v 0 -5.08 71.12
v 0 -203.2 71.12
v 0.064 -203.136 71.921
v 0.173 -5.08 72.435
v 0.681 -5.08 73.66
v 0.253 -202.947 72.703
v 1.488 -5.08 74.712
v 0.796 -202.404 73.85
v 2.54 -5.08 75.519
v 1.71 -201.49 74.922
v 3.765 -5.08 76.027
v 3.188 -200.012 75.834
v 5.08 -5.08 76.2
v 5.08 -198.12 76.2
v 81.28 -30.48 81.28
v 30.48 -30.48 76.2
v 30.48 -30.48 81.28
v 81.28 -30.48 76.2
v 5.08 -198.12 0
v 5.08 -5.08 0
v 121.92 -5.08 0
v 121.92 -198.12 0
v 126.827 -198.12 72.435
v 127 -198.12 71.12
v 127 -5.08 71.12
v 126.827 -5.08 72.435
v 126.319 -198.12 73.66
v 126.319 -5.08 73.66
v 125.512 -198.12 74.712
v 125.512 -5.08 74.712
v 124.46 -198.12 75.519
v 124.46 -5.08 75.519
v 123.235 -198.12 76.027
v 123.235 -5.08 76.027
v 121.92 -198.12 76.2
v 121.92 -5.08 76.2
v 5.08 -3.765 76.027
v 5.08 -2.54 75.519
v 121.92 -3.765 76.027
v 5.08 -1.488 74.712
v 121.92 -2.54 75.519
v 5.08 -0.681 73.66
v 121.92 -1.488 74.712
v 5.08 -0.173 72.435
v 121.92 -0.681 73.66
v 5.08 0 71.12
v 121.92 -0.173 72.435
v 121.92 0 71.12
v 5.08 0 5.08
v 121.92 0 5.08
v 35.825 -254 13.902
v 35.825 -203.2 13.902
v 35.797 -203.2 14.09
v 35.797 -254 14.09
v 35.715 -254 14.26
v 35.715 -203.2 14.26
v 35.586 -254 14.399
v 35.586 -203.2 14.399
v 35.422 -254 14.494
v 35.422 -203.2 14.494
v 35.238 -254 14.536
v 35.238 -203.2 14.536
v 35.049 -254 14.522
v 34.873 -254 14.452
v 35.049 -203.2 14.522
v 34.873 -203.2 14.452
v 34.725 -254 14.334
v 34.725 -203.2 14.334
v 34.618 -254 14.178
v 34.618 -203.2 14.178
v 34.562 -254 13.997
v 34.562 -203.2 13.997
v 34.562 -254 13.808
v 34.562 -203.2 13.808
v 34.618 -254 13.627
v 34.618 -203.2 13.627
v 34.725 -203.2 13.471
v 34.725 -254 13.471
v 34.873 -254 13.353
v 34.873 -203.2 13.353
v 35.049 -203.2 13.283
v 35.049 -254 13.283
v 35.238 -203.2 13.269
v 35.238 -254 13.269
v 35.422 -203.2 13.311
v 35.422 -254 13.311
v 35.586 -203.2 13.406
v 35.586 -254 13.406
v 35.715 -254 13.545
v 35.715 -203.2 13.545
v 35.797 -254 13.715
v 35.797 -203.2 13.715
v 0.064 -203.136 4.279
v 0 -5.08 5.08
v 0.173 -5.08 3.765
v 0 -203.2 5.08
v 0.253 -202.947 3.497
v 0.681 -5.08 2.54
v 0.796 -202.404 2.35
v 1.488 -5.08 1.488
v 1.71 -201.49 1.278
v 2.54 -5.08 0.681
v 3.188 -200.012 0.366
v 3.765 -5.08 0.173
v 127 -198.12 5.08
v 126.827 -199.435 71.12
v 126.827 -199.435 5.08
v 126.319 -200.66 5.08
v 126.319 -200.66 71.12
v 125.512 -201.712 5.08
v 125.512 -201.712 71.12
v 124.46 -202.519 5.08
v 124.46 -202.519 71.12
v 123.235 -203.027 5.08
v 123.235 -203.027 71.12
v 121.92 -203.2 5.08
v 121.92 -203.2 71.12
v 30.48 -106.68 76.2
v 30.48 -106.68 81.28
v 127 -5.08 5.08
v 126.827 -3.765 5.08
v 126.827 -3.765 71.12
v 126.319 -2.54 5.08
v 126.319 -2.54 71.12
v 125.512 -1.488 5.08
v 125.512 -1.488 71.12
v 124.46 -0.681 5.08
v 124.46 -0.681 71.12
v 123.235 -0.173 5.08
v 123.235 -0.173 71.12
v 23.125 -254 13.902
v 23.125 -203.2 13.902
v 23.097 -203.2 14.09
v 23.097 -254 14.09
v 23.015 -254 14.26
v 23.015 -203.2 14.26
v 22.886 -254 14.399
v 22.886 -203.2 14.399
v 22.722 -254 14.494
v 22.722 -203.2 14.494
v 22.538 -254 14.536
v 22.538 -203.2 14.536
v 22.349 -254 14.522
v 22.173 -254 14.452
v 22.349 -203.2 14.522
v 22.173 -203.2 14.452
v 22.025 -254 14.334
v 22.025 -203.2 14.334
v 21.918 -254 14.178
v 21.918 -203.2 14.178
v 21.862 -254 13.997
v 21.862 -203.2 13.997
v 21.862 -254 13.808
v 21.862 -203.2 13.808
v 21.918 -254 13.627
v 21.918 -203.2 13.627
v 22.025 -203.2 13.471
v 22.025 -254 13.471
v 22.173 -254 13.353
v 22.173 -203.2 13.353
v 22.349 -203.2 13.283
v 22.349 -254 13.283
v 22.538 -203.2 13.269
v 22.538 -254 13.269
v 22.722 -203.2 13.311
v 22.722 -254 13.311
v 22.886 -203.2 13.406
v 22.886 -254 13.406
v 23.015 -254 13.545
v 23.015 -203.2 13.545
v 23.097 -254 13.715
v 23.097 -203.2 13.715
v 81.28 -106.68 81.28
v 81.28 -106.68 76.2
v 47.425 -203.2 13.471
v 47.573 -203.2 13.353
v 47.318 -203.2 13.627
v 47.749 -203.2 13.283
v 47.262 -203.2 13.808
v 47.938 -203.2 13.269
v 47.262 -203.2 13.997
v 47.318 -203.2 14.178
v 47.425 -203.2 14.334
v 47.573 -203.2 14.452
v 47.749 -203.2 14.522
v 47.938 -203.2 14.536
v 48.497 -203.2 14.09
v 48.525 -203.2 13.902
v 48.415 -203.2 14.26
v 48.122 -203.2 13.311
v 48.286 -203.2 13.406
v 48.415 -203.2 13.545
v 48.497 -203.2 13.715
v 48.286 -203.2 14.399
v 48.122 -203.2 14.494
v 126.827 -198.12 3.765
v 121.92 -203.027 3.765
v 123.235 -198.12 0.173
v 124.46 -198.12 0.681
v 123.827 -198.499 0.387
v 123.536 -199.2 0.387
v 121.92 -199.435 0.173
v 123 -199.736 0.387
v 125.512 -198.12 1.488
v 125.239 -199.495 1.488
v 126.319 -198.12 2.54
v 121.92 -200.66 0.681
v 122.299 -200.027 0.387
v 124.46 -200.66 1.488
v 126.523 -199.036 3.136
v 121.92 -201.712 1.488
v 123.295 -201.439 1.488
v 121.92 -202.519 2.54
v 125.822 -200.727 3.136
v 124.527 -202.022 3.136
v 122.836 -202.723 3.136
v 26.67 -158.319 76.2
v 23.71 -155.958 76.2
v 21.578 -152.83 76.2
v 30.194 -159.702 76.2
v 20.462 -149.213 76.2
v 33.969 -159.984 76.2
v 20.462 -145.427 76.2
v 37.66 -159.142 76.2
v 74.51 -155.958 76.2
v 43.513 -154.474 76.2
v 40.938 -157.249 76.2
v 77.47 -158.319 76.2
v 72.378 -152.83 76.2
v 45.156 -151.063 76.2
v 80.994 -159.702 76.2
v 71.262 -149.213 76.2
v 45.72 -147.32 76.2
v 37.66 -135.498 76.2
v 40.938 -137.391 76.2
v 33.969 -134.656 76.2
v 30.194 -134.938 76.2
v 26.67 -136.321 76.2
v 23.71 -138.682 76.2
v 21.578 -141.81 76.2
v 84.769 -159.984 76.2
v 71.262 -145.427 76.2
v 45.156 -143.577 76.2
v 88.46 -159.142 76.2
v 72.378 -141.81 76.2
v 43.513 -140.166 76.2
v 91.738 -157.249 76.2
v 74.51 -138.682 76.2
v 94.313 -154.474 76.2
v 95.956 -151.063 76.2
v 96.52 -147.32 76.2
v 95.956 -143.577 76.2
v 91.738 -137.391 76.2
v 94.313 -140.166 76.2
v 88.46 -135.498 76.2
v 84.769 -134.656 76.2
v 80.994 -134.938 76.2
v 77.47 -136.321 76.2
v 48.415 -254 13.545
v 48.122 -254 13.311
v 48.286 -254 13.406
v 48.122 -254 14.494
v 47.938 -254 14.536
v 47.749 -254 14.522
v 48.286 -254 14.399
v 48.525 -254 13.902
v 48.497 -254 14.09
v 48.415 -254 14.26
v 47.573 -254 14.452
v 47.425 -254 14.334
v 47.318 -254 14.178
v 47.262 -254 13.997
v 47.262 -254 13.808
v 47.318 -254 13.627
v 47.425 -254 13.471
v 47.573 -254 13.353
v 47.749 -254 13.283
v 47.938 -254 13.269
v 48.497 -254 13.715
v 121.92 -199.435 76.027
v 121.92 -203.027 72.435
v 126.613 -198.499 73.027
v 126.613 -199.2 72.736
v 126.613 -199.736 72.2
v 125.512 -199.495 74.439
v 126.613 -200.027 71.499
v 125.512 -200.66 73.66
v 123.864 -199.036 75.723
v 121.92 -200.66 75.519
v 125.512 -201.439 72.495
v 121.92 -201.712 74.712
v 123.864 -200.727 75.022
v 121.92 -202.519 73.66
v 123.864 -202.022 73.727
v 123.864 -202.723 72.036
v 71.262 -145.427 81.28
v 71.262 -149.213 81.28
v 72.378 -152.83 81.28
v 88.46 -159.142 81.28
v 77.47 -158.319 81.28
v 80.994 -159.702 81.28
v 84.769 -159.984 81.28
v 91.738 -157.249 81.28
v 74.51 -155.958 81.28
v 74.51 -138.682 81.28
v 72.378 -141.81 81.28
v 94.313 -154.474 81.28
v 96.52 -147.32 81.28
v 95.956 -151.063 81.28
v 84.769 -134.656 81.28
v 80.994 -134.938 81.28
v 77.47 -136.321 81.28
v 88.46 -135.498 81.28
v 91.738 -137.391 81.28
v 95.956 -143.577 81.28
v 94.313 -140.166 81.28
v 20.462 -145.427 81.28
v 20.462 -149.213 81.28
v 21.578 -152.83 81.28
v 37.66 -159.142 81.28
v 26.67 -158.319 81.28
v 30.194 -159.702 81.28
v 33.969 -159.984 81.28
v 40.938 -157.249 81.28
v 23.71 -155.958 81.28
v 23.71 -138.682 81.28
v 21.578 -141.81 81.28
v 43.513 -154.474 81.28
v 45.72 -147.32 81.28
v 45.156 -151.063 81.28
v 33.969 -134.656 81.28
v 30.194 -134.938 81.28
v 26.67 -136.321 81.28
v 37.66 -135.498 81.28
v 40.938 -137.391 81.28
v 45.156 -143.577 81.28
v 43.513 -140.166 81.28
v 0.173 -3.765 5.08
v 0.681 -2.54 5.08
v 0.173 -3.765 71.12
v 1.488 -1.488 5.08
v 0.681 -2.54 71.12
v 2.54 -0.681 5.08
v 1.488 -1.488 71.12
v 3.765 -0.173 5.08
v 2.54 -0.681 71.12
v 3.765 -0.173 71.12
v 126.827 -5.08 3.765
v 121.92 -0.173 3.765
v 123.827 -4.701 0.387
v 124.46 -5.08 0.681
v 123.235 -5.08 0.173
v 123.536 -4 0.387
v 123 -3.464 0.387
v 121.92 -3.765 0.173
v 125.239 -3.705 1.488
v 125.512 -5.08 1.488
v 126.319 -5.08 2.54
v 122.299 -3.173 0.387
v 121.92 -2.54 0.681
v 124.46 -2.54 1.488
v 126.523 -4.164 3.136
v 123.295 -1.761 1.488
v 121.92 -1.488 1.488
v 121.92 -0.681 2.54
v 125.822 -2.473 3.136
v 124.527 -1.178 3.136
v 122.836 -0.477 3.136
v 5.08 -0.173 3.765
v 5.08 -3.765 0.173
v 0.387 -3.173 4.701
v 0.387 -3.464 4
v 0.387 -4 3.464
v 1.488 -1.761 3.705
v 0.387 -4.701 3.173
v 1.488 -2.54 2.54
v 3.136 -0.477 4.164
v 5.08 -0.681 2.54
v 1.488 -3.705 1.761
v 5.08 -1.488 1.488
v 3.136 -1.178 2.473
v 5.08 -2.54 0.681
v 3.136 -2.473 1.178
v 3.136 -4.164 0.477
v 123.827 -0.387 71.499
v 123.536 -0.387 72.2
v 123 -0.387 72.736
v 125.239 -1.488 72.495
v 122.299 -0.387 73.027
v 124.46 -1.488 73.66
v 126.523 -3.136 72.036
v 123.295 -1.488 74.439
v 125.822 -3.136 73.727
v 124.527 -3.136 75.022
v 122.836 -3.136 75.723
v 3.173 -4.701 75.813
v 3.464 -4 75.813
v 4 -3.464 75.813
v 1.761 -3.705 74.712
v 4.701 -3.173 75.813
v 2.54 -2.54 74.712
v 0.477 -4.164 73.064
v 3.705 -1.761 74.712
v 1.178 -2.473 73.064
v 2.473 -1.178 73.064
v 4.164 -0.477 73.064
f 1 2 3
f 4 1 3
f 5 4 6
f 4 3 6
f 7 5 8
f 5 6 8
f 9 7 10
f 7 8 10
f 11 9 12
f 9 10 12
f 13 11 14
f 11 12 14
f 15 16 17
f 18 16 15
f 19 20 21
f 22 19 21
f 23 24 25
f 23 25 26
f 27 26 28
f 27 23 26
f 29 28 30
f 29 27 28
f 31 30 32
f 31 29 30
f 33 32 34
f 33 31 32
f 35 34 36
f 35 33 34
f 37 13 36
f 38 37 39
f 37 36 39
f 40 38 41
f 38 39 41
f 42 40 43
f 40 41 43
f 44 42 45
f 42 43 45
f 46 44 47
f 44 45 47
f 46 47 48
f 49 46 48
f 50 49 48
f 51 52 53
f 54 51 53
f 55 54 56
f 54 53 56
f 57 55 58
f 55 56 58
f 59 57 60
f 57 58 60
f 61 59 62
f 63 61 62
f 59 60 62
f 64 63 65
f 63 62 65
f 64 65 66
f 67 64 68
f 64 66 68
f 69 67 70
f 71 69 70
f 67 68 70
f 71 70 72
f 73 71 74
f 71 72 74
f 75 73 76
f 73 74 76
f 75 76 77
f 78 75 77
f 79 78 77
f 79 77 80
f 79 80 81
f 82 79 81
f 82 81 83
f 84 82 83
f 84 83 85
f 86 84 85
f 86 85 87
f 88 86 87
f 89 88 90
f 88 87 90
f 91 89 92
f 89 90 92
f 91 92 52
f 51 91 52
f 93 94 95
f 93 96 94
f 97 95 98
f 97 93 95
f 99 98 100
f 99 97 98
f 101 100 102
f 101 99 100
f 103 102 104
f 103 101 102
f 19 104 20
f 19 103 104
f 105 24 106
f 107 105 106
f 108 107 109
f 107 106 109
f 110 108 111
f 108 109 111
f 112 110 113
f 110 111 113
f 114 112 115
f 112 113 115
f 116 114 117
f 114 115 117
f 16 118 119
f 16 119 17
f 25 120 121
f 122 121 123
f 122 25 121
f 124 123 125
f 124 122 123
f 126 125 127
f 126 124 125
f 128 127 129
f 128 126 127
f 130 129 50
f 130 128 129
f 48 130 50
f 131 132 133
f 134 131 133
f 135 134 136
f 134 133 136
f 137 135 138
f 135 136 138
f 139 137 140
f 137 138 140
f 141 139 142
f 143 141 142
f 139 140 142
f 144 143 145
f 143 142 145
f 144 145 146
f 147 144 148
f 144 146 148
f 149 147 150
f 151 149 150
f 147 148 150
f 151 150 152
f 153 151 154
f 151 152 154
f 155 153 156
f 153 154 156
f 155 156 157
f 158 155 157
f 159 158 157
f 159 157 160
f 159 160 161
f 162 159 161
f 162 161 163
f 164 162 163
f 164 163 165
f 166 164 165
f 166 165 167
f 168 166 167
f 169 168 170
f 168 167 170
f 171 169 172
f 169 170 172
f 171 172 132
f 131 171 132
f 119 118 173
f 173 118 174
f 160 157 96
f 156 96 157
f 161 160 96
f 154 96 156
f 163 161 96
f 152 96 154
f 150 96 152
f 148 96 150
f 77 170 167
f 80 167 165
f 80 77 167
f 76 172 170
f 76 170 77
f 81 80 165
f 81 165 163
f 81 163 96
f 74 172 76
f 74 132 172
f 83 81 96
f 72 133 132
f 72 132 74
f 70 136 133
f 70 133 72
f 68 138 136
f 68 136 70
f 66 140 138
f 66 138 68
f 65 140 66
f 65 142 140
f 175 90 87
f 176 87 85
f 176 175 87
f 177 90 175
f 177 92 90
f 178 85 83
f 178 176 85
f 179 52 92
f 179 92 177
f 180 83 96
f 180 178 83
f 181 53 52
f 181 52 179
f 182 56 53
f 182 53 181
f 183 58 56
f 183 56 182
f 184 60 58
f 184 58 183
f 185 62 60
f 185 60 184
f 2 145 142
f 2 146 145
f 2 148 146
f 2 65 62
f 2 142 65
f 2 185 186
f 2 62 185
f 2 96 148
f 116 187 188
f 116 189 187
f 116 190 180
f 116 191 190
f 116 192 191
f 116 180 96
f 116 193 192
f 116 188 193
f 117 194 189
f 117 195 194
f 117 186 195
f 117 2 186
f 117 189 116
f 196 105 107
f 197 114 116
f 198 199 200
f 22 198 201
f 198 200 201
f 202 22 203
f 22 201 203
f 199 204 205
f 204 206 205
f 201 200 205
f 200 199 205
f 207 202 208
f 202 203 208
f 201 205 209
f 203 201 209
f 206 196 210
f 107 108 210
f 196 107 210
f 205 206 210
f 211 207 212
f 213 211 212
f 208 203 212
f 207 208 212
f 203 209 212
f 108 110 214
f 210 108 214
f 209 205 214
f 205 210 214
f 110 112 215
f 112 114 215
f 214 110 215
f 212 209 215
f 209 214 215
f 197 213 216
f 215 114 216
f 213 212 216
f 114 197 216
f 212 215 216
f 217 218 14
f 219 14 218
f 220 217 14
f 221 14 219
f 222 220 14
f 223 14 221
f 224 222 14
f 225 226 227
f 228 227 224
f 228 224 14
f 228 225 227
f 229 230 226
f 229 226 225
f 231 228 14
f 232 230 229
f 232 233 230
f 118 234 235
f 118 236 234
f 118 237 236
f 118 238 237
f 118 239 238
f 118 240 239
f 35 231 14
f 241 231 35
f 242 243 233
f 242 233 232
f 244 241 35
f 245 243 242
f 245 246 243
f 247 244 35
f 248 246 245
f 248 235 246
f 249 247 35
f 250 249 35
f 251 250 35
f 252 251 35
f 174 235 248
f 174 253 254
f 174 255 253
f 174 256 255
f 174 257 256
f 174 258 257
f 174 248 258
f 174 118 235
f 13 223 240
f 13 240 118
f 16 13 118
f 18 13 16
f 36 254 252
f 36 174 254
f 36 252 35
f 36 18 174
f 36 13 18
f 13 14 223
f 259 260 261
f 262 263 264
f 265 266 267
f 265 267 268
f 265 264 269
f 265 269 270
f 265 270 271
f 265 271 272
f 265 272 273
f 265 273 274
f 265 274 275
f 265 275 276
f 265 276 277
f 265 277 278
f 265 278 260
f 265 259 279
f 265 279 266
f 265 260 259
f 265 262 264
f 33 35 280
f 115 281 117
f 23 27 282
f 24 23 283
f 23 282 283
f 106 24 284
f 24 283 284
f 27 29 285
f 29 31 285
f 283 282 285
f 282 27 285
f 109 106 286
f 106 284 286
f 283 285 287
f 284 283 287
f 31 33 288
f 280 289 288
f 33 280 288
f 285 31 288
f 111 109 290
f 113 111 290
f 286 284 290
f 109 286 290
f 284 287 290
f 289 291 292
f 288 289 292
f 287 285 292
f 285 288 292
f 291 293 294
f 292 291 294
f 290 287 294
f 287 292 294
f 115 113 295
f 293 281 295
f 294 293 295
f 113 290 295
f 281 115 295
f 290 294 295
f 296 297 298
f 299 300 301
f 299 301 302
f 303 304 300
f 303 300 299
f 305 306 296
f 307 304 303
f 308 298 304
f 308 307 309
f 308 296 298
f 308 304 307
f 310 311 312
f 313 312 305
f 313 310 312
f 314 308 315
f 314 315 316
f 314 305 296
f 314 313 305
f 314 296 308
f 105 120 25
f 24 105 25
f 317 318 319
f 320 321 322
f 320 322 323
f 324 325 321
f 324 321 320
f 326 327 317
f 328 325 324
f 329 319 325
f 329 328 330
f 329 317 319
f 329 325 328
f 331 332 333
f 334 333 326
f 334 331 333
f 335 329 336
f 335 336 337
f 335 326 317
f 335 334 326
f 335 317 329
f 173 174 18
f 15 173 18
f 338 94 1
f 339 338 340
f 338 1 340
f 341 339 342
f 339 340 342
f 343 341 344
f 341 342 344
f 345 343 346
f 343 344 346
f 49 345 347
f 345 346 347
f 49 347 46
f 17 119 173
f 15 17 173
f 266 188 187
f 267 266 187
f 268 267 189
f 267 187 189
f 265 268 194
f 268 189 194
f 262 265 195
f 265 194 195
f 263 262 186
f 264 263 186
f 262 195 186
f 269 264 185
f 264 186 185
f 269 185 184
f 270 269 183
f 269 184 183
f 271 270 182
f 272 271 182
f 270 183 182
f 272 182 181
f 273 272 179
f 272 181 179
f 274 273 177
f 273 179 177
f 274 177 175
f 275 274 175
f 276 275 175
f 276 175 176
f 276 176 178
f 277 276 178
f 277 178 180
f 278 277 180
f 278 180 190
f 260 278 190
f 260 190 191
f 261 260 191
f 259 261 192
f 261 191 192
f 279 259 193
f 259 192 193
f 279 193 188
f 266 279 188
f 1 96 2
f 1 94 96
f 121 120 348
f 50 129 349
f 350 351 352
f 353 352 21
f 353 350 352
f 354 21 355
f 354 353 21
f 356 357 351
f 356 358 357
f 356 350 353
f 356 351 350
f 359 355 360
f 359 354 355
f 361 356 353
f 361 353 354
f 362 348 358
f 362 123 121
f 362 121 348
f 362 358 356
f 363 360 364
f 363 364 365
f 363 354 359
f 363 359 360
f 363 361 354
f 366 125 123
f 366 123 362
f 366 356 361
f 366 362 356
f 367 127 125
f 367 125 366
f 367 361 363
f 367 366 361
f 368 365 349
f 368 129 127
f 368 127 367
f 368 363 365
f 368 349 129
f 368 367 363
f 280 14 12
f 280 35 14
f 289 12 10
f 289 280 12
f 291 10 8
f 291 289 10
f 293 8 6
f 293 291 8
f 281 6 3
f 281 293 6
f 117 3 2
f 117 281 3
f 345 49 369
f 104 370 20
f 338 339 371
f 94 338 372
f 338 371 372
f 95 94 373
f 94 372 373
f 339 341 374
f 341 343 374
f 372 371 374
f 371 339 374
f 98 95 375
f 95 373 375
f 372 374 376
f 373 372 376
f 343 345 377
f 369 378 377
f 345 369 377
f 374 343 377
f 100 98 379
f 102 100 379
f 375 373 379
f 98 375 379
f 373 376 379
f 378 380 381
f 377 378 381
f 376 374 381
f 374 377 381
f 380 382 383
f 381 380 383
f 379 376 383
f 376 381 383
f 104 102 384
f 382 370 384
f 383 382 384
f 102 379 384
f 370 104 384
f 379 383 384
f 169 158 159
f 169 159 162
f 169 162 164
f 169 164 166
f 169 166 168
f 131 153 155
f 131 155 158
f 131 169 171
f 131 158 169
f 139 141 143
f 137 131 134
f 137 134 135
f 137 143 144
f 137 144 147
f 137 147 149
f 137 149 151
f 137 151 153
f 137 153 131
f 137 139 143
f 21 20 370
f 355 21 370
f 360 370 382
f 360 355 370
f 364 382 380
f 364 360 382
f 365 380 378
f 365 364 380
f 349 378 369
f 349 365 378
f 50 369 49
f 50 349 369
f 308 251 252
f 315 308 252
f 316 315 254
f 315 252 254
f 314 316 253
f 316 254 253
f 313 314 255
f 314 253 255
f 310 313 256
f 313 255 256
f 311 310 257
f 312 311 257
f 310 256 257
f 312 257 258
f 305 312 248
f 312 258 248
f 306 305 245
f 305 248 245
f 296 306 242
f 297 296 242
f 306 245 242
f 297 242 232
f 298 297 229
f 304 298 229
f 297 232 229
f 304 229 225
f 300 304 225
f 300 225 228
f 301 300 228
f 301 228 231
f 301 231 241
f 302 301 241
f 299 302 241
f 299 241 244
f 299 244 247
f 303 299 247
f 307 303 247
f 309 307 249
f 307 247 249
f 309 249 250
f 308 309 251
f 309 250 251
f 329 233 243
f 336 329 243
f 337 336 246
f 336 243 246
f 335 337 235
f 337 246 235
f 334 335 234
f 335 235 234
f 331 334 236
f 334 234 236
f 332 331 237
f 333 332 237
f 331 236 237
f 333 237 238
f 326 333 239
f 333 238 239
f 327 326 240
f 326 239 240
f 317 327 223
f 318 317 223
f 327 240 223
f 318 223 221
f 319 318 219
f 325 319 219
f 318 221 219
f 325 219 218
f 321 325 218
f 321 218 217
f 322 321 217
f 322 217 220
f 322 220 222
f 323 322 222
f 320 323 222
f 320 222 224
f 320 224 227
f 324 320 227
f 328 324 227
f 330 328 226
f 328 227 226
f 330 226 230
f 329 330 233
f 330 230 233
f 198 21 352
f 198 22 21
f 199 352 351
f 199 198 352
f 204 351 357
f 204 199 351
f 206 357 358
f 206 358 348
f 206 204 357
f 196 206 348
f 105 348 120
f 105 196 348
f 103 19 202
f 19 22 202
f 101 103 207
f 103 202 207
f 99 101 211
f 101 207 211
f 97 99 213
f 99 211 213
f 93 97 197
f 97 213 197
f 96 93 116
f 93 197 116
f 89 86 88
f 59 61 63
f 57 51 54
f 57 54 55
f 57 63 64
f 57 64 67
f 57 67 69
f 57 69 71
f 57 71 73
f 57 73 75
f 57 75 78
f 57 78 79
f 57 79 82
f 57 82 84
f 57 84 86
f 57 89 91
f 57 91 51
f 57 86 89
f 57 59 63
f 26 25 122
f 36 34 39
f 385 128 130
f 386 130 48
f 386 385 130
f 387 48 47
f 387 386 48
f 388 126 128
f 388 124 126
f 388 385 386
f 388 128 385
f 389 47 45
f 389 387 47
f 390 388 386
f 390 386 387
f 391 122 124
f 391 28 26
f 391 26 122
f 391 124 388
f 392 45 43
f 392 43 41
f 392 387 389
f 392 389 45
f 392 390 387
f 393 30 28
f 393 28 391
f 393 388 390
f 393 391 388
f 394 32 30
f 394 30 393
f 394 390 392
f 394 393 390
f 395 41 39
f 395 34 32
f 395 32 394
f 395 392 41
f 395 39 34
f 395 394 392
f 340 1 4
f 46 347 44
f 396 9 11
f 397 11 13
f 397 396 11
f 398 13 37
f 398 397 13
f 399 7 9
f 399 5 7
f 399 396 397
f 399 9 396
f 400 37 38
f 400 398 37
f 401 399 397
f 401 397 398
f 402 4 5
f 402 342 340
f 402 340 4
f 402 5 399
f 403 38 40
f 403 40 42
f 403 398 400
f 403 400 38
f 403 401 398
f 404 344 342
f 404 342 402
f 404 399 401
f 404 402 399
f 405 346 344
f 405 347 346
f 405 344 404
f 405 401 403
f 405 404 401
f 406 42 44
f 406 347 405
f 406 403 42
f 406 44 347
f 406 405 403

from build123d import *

# Parameters (mm, degrees)
F0_W     = 127
F0_H     = 76.2
F1_DEPTH = 203.2
F2_R     = 5.08
F3_R     = 0.635
F4_DEPTH = 50.8
F5_W     = 50.8
F5_H     = 76.2
F5_R     = 12.7
F6_DEPTH = 5.08


with BuildPart() as f1:
    # F0 (on Front) → F1 (new body)
    with BuildSketch(Plane.XZ):
        with Locations((63.5, 38.1)):
            Rectangle(F0_W, F0_H)
    extrude(amount=F1_DEPTH)

    # F2
    f2_edges = [f1.edges().sort_by_distance(p)[0] for p in [
        (63.5, -203.2, 76.2),
        (127, -101.6, 76.2),
        (127, -203.2, 38.1),
        (127, 0, 38.1),
        (127, -101.6, 0),
        (63.5, -203.2, 0),
        (63.5, 0, 0),
        (0, 0, 38.1),
        (0, -101.6, 0),
        (0, -101.6, 76.2),
        (63.5, 0, 76.2),
    ]]
    fillet(f2_edges, radius=F2_R)

    # F3 (on face) → F4 (join)
    with BuildSketch(Plane.XZ.offset(203.2)):
        with Locations((22.490209, 13.902469)):
            Circle(F3_R)
        with Locations((35.190209, 13.902469)):
            Circle(F3_R)
        with Locations((47.890209, 13.902469)):
            Circle(F3_R)
    extrude(amount=F4_DEPTH)

    # F5 (on face) → F6 (join)
    with BuildSketch(Plane.XY.offset(76.2)):
        with Locations((55.88, -68.58)):
            Rectangle(F5_W, F5_H)
        with Locations((33.02, -147.32)):
            Circle(F5_R)
        with Locations((83.82, -147.32)):
            Circle(F5_R)
    extrude(amount=F6_DEPTH)


solid = f1.part
